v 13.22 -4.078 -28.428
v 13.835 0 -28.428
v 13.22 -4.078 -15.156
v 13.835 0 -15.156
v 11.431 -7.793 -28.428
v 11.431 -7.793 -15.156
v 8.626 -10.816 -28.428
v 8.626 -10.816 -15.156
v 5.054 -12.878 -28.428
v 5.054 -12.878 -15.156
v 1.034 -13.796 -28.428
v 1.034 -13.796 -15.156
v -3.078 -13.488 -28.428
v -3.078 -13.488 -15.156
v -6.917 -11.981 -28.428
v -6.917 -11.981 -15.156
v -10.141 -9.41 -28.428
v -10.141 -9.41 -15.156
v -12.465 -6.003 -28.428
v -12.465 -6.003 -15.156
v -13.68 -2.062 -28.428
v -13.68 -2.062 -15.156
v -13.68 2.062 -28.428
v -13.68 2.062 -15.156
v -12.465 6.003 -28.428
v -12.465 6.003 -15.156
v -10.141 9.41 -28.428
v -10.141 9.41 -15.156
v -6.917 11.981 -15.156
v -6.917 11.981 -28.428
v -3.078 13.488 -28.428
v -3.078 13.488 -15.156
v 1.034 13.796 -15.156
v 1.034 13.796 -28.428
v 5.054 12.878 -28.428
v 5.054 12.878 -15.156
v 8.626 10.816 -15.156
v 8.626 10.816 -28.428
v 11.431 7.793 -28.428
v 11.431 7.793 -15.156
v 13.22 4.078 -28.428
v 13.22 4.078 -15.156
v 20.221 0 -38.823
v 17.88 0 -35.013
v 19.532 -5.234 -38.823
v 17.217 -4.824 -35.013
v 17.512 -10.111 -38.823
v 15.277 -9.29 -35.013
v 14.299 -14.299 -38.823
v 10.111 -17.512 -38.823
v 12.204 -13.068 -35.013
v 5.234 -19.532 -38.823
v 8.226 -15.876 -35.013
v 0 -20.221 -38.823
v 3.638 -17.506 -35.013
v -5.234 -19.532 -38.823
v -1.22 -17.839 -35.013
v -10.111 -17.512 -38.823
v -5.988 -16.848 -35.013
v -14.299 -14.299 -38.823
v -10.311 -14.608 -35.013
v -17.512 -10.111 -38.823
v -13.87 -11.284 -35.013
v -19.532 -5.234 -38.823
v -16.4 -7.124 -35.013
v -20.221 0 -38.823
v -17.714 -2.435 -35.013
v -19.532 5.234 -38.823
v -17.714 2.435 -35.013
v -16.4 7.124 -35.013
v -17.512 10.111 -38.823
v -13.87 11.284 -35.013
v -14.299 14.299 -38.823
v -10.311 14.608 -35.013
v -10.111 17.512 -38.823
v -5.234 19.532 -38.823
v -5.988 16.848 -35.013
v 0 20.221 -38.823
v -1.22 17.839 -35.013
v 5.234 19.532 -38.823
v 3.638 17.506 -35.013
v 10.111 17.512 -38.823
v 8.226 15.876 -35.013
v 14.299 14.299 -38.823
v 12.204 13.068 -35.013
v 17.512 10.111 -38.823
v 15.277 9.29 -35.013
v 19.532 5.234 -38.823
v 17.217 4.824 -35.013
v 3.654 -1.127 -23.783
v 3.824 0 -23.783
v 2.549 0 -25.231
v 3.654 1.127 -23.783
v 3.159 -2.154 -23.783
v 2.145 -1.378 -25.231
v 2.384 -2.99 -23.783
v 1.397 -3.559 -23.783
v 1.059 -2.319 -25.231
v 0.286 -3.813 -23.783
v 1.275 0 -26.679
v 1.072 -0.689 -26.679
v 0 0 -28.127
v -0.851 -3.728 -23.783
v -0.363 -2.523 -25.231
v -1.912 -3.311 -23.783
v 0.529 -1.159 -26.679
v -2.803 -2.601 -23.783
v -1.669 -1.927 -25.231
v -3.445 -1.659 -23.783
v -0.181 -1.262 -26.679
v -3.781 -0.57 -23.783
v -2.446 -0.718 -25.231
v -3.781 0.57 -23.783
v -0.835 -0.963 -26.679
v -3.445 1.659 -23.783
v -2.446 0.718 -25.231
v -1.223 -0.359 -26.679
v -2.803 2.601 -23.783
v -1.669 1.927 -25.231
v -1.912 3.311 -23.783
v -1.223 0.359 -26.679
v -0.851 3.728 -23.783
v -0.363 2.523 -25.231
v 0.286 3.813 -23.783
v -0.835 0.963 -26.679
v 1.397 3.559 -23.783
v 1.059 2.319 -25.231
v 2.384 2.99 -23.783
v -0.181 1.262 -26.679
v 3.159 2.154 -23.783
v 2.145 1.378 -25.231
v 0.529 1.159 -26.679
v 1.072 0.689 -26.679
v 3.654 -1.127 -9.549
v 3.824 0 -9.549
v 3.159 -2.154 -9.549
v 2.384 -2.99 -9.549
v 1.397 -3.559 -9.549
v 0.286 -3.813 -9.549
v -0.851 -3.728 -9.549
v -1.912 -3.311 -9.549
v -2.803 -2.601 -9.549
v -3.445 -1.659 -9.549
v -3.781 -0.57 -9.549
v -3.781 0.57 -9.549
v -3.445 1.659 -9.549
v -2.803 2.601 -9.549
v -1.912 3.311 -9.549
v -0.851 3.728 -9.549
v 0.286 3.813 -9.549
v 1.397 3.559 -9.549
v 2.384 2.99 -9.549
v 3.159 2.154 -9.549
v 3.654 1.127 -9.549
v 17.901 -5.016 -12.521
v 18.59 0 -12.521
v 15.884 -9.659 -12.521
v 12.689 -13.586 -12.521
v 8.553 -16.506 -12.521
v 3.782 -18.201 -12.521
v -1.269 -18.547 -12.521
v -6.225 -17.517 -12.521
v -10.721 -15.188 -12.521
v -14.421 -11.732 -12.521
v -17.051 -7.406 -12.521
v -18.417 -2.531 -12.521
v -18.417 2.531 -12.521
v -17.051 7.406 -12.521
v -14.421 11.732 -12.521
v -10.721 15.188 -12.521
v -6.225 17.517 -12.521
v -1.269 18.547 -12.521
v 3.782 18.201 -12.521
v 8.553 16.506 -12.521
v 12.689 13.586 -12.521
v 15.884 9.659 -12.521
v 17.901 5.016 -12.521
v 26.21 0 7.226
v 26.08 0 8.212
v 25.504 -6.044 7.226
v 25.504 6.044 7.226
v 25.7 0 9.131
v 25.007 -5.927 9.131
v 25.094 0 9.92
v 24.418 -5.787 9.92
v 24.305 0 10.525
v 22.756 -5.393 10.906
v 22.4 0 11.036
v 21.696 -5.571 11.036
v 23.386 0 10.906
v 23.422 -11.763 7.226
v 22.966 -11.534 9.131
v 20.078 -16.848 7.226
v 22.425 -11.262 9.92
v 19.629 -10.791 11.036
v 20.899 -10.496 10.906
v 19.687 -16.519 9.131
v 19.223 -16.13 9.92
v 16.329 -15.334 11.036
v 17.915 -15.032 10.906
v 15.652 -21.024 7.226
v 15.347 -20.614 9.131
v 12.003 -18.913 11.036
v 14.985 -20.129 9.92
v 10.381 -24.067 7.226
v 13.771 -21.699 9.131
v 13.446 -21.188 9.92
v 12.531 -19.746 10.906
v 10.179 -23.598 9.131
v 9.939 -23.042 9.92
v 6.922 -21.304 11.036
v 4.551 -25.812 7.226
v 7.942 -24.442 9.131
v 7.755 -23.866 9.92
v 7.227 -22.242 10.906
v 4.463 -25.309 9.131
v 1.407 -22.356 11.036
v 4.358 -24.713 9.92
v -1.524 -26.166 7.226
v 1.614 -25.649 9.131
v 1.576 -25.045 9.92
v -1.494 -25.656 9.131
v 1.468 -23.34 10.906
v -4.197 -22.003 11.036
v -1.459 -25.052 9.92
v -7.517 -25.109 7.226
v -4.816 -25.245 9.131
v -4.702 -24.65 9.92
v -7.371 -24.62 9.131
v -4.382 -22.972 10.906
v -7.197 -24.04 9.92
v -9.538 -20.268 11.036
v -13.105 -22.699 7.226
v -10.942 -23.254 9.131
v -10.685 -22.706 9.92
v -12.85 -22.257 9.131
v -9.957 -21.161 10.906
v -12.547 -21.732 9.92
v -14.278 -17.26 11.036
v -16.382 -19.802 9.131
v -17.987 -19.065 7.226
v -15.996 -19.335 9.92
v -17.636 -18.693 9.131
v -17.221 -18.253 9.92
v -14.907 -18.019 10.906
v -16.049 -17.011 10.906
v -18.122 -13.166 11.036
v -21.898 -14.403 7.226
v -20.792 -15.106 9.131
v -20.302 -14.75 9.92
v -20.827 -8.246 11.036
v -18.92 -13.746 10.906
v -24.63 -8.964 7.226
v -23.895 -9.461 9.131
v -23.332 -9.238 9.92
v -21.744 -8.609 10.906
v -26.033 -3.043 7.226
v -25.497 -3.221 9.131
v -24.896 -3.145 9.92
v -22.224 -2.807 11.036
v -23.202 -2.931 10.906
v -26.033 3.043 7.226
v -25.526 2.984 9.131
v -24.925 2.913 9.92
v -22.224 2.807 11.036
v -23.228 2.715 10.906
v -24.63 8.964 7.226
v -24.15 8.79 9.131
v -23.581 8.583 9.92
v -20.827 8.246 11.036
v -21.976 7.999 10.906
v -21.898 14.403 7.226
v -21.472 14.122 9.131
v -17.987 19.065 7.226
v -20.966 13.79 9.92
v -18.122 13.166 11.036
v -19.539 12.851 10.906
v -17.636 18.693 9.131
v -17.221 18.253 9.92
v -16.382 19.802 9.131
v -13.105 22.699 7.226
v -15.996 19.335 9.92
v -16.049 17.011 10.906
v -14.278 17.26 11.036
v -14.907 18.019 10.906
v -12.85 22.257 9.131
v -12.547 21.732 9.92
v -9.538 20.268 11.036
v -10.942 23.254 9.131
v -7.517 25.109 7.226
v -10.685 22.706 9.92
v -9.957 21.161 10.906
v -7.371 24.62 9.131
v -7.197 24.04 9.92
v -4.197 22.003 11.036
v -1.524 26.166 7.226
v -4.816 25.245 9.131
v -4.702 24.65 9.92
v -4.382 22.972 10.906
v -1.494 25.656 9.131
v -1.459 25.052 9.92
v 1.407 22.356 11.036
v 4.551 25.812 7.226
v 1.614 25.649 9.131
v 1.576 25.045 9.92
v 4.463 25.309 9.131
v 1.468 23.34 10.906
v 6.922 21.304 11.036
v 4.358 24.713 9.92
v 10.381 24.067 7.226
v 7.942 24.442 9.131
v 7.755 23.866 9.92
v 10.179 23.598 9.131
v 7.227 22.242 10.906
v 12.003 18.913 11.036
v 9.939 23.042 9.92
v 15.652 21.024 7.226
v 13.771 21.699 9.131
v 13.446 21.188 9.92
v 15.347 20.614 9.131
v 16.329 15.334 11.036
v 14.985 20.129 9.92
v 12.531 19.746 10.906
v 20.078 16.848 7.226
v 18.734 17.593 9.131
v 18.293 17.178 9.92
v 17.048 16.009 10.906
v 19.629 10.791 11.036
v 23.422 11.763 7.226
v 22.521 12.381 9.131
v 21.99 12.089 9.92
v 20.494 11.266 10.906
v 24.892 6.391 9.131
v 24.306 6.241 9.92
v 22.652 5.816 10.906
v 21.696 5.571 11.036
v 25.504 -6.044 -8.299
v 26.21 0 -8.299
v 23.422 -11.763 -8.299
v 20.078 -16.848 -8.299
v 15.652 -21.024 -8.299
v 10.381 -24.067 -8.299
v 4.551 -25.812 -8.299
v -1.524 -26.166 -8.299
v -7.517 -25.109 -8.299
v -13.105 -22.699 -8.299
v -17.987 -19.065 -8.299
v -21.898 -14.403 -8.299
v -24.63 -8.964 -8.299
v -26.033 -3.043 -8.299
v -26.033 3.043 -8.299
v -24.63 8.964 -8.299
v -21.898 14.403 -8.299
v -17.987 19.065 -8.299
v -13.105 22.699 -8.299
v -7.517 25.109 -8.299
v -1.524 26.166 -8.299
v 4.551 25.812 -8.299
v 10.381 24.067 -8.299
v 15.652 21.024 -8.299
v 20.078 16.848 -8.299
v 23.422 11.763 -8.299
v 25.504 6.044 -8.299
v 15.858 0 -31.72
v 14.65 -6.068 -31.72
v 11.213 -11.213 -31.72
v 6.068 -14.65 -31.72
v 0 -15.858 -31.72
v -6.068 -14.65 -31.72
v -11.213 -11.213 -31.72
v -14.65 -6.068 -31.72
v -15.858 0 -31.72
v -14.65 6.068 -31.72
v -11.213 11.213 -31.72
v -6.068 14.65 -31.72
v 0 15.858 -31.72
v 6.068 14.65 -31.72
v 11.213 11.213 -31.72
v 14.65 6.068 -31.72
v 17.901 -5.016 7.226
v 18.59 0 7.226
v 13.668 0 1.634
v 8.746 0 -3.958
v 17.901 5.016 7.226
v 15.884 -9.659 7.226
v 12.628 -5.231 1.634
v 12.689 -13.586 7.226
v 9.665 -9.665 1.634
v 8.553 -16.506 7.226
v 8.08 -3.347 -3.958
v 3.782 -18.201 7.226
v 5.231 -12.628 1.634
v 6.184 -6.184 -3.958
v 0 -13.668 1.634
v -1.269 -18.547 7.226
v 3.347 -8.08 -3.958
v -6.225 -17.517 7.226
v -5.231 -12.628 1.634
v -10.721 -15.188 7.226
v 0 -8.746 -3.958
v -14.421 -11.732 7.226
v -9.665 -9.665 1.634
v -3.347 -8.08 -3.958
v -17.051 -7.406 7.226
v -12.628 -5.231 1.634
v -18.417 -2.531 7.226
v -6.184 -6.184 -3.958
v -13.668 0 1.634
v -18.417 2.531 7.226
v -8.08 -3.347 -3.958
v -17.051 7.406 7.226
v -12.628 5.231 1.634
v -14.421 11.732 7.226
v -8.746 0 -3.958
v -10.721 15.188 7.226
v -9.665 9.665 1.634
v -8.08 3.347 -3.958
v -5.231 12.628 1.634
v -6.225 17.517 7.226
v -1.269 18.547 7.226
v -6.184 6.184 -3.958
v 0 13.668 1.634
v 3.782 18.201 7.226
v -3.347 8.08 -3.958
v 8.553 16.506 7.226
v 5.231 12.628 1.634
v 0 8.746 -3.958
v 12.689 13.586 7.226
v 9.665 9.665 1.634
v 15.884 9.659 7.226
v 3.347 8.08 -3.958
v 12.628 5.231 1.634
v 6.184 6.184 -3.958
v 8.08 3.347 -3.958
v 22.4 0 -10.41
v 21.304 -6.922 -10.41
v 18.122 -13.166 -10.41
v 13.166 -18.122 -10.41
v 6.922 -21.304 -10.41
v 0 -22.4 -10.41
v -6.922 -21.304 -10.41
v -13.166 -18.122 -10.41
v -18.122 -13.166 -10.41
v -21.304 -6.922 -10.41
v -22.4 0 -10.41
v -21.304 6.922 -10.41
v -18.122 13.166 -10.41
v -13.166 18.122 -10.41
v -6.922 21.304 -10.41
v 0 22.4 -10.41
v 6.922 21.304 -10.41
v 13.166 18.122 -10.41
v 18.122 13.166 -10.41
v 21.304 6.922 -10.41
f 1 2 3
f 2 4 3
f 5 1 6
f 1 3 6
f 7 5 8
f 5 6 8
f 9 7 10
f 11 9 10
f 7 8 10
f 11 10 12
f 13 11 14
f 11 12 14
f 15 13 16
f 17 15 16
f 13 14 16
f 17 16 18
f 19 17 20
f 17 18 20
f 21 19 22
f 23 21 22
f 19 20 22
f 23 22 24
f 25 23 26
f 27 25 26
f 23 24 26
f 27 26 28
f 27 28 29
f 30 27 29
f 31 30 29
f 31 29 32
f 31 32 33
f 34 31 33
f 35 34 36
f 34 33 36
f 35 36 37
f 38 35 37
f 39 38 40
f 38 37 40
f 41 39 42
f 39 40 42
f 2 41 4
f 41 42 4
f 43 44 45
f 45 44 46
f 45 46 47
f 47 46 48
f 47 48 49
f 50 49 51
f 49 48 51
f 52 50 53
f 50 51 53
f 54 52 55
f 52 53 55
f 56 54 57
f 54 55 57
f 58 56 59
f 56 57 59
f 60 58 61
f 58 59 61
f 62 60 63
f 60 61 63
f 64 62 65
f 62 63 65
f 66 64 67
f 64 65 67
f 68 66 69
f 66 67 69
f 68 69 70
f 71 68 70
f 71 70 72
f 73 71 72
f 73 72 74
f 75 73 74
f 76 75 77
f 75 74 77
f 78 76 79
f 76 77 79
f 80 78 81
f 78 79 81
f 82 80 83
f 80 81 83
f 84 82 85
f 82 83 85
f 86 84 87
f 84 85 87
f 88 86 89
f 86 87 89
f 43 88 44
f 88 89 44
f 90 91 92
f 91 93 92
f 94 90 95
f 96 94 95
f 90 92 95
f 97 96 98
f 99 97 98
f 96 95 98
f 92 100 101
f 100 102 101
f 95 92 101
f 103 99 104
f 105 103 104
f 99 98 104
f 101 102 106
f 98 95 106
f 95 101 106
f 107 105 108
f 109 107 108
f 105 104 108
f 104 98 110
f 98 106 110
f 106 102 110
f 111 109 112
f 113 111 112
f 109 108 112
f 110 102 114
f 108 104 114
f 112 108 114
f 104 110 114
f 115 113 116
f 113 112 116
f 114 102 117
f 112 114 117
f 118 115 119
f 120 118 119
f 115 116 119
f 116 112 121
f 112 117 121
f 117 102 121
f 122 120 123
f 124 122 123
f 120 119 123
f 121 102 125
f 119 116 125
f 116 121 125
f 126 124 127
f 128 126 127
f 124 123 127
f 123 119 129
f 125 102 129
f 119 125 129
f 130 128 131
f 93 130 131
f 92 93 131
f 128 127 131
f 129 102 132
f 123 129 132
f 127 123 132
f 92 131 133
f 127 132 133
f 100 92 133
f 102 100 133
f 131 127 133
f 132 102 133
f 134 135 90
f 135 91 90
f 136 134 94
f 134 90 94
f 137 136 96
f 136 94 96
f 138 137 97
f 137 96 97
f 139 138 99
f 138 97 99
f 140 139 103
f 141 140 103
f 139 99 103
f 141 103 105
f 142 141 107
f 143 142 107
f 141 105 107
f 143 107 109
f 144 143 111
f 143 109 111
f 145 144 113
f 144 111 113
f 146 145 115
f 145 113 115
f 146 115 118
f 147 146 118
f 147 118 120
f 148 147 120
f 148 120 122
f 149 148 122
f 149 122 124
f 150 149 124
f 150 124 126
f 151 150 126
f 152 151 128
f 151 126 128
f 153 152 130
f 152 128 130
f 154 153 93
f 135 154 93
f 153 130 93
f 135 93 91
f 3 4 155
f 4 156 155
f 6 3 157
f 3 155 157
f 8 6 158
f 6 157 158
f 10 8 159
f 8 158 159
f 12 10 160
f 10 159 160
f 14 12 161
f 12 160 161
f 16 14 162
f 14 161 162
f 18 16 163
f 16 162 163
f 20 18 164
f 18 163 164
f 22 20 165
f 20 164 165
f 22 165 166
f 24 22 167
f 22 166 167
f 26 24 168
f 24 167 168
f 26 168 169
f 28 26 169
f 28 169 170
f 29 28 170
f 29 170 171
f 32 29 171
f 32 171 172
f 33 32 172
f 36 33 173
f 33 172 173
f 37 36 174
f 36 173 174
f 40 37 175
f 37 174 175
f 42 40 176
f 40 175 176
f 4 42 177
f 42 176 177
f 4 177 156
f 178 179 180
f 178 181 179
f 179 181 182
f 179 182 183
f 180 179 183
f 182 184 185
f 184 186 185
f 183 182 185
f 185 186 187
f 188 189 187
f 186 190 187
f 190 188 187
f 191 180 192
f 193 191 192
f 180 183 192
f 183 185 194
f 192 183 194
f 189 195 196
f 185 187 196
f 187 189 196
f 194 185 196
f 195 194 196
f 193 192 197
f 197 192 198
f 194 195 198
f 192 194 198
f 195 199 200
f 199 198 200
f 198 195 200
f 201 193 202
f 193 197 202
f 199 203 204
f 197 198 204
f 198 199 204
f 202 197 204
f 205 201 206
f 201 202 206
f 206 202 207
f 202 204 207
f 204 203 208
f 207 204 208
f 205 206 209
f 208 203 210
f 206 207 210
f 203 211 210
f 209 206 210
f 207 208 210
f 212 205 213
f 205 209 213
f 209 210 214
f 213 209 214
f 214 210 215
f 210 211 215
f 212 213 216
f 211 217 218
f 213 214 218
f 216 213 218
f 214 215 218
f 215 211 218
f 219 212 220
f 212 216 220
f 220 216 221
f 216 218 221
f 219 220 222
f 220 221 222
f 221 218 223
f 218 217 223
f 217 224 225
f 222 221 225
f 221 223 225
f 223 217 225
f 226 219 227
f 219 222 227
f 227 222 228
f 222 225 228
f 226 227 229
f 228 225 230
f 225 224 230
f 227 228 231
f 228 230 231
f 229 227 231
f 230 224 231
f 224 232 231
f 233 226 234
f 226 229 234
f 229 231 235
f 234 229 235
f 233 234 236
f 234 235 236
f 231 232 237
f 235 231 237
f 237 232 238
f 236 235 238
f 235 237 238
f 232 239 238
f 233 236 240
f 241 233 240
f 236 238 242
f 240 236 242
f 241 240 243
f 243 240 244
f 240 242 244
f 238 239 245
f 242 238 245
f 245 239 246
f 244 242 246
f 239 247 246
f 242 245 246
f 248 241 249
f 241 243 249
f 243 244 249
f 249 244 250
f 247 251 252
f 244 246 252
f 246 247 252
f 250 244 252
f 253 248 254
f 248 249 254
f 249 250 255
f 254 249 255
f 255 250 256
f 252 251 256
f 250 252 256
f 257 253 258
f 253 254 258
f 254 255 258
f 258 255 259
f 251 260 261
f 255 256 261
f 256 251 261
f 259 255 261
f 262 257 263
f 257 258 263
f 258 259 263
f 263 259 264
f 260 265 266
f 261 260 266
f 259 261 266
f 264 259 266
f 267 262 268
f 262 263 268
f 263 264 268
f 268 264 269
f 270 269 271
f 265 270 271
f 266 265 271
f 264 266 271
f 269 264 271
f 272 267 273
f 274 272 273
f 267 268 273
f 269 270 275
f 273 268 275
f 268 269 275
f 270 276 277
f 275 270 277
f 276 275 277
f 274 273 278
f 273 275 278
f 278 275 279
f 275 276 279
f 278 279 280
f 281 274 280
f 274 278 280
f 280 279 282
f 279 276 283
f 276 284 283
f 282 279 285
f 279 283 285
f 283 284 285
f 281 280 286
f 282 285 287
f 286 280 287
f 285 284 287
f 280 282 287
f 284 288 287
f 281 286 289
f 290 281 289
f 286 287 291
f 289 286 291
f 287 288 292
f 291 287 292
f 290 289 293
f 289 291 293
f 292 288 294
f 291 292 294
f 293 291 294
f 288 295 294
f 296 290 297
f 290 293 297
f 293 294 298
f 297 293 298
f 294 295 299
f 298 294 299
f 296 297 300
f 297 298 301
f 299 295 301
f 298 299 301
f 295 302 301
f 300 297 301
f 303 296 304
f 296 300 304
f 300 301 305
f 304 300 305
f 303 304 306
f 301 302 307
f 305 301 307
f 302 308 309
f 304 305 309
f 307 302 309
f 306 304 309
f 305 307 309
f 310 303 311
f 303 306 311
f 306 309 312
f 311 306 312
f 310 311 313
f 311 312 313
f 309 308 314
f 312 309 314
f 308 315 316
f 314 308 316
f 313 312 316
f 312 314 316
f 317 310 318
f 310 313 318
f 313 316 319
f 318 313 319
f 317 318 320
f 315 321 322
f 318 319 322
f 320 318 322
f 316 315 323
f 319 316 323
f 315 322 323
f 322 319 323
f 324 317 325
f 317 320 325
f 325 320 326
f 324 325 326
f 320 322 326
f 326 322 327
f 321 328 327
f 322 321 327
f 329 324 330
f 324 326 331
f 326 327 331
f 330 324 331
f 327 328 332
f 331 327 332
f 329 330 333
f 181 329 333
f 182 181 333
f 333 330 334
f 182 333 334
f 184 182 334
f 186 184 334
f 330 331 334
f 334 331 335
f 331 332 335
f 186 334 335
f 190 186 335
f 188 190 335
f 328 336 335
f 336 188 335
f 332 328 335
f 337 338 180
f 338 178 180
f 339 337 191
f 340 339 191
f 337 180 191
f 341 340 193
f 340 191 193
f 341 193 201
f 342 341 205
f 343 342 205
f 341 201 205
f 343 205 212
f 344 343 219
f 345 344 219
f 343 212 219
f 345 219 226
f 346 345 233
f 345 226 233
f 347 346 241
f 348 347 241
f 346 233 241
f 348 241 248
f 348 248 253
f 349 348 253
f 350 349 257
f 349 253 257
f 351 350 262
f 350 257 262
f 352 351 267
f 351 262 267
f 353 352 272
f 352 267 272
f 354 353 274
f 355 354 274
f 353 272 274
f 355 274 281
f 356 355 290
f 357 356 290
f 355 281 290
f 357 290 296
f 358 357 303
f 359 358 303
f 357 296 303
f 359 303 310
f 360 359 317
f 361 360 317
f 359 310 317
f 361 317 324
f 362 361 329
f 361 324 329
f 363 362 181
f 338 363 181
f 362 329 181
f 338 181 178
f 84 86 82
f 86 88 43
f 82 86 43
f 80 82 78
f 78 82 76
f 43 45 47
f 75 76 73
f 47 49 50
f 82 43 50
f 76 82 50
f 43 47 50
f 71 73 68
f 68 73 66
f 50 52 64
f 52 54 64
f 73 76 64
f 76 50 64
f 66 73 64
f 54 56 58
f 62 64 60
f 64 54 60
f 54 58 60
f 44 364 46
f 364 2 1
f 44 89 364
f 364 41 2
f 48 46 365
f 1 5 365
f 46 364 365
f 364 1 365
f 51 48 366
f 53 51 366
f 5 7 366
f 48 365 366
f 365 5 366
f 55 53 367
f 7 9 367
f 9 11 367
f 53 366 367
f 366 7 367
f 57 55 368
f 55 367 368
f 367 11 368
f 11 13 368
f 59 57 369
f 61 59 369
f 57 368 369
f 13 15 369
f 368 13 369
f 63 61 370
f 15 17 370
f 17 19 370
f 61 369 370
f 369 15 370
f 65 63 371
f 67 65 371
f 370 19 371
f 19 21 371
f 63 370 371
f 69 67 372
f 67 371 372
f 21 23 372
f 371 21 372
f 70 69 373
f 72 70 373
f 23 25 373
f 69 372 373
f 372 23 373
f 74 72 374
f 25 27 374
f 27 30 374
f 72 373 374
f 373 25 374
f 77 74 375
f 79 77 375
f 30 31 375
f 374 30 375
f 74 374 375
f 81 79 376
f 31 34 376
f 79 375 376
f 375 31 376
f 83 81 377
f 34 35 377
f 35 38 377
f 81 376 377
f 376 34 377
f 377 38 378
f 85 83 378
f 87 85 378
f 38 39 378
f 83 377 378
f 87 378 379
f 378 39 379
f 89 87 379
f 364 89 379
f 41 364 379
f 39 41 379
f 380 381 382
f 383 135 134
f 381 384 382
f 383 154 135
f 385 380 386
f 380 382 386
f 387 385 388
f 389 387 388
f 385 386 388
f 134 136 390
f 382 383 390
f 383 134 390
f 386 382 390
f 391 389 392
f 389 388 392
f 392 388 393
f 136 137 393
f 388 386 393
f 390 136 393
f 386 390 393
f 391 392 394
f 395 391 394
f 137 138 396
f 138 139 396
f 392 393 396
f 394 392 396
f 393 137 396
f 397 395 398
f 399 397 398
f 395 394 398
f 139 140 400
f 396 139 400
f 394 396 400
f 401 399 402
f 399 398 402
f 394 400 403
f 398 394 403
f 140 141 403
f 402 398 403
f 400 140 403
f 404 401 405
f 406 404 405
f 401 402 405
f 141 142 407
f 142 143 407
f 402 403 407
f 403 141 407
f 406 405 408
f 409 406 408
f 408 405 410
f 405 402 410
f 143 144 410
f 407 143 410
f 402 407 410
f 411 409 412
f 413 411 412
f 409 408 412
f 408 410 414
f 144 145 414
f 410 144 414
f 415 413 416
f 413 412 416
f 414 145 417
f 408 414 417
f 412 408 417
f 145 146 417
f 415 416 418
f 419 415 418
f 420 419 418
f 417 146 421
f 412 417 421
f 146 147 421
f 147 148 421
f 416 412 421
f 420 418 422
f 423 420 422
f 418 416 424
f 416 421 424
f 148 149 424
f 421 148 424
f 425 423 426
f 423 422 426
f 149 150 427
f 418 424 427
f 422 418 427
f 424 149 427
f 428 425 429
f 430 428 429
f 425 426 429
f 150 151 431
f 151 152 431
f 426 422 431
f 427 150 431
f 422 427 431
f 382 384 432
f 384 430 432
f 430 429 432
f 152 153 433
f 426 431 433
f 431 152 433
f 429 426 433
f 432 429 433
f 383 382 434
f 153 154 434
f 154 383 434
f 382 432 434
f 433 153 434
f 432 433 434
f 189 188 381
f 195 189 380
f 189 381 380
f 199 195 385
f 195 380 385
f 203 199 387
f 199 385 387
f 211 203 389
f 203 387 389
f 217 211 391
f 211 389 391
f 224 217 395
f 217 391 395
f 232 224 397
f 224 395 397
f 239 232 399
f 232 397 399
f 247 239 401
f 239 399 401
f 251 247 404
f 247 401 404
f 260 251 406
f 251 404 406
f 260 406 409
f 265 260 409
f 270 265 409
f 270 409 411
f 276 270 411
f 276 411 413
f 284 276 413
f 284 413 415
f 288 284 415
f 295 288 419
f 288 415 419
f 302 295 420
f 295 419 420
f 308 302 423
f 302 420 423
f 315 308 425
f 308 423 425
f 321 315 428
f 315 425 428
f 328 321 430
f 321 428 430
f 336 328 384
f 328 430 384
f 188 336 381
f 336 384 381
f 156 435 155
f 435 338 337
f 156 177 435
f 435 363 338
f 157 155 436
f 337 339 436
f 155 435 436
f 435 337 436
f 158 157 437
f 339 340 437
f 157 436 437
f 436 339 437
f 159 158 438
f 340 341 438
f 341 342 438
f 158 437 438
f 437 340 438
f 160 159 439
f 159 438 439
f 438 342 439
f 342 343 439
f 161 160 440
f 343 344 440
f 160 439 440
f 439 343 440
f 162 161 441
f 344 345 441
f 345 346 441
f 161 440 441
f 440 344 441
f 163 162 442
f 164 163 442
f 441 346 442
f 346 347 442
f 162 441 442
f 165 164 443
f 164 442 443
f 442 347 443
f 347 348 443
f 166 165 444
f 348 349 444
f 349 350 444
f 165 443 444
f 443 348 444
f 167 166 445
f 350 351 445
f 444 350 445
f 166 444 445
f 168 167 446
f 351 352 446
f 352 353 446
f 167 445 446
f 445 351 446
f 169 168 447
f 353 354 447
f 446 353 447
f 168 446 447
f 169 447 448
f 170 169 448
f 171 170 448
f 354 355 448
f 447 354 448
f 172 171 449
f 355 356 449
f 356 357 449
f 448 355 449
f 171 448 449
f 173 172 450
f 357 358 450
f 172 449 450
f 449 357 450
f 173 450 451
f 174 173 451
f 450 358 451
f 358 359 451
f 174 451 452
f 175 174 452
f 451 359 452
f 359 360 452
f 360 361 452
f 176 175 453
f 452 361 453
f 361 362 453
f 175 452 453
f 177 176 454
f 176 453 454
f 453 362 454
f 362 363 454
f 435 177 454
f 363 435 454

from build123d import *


with BuildPart() as f1:
    # F0 (on Front) → F1 (revolve)
    with BuildSketch(Plane.XZ):
        Polygon((17.880435, -35.012588), (0, -35.012588), (0, -38.822588), (20.221465, -38.822588), align=None)
        with BuildLine():
            ThreePointArc((26.210172, 7.225862), (25.094249, 9.919939), (22.400172, 11.035862))
            Line((22.400172, 11.035862), (18.590172, 7.225862))
            Line((18.590172, 7.225862), (18.590172, -12.52082))
            Line((18.590172, -12.52082), (26.210172, -8.298599))
            Line((26.210172, -8.298599), (26.210172, 7.225862))
        make_face()
        Polygon((18.590172, -12.52082), (18.590172, 7.225862), (3.823765, -9.549403), (3.823765, -23.782769), (0, -28.126729), (0, -35.012588), (17.880435, -35.012588), (13.834589, -28.428022), (13.834589, -15.155875), align=None)
    revolve(axis=Axis((0, 0, -13.893363), (0, 0, -1)))


solid = f1.part
